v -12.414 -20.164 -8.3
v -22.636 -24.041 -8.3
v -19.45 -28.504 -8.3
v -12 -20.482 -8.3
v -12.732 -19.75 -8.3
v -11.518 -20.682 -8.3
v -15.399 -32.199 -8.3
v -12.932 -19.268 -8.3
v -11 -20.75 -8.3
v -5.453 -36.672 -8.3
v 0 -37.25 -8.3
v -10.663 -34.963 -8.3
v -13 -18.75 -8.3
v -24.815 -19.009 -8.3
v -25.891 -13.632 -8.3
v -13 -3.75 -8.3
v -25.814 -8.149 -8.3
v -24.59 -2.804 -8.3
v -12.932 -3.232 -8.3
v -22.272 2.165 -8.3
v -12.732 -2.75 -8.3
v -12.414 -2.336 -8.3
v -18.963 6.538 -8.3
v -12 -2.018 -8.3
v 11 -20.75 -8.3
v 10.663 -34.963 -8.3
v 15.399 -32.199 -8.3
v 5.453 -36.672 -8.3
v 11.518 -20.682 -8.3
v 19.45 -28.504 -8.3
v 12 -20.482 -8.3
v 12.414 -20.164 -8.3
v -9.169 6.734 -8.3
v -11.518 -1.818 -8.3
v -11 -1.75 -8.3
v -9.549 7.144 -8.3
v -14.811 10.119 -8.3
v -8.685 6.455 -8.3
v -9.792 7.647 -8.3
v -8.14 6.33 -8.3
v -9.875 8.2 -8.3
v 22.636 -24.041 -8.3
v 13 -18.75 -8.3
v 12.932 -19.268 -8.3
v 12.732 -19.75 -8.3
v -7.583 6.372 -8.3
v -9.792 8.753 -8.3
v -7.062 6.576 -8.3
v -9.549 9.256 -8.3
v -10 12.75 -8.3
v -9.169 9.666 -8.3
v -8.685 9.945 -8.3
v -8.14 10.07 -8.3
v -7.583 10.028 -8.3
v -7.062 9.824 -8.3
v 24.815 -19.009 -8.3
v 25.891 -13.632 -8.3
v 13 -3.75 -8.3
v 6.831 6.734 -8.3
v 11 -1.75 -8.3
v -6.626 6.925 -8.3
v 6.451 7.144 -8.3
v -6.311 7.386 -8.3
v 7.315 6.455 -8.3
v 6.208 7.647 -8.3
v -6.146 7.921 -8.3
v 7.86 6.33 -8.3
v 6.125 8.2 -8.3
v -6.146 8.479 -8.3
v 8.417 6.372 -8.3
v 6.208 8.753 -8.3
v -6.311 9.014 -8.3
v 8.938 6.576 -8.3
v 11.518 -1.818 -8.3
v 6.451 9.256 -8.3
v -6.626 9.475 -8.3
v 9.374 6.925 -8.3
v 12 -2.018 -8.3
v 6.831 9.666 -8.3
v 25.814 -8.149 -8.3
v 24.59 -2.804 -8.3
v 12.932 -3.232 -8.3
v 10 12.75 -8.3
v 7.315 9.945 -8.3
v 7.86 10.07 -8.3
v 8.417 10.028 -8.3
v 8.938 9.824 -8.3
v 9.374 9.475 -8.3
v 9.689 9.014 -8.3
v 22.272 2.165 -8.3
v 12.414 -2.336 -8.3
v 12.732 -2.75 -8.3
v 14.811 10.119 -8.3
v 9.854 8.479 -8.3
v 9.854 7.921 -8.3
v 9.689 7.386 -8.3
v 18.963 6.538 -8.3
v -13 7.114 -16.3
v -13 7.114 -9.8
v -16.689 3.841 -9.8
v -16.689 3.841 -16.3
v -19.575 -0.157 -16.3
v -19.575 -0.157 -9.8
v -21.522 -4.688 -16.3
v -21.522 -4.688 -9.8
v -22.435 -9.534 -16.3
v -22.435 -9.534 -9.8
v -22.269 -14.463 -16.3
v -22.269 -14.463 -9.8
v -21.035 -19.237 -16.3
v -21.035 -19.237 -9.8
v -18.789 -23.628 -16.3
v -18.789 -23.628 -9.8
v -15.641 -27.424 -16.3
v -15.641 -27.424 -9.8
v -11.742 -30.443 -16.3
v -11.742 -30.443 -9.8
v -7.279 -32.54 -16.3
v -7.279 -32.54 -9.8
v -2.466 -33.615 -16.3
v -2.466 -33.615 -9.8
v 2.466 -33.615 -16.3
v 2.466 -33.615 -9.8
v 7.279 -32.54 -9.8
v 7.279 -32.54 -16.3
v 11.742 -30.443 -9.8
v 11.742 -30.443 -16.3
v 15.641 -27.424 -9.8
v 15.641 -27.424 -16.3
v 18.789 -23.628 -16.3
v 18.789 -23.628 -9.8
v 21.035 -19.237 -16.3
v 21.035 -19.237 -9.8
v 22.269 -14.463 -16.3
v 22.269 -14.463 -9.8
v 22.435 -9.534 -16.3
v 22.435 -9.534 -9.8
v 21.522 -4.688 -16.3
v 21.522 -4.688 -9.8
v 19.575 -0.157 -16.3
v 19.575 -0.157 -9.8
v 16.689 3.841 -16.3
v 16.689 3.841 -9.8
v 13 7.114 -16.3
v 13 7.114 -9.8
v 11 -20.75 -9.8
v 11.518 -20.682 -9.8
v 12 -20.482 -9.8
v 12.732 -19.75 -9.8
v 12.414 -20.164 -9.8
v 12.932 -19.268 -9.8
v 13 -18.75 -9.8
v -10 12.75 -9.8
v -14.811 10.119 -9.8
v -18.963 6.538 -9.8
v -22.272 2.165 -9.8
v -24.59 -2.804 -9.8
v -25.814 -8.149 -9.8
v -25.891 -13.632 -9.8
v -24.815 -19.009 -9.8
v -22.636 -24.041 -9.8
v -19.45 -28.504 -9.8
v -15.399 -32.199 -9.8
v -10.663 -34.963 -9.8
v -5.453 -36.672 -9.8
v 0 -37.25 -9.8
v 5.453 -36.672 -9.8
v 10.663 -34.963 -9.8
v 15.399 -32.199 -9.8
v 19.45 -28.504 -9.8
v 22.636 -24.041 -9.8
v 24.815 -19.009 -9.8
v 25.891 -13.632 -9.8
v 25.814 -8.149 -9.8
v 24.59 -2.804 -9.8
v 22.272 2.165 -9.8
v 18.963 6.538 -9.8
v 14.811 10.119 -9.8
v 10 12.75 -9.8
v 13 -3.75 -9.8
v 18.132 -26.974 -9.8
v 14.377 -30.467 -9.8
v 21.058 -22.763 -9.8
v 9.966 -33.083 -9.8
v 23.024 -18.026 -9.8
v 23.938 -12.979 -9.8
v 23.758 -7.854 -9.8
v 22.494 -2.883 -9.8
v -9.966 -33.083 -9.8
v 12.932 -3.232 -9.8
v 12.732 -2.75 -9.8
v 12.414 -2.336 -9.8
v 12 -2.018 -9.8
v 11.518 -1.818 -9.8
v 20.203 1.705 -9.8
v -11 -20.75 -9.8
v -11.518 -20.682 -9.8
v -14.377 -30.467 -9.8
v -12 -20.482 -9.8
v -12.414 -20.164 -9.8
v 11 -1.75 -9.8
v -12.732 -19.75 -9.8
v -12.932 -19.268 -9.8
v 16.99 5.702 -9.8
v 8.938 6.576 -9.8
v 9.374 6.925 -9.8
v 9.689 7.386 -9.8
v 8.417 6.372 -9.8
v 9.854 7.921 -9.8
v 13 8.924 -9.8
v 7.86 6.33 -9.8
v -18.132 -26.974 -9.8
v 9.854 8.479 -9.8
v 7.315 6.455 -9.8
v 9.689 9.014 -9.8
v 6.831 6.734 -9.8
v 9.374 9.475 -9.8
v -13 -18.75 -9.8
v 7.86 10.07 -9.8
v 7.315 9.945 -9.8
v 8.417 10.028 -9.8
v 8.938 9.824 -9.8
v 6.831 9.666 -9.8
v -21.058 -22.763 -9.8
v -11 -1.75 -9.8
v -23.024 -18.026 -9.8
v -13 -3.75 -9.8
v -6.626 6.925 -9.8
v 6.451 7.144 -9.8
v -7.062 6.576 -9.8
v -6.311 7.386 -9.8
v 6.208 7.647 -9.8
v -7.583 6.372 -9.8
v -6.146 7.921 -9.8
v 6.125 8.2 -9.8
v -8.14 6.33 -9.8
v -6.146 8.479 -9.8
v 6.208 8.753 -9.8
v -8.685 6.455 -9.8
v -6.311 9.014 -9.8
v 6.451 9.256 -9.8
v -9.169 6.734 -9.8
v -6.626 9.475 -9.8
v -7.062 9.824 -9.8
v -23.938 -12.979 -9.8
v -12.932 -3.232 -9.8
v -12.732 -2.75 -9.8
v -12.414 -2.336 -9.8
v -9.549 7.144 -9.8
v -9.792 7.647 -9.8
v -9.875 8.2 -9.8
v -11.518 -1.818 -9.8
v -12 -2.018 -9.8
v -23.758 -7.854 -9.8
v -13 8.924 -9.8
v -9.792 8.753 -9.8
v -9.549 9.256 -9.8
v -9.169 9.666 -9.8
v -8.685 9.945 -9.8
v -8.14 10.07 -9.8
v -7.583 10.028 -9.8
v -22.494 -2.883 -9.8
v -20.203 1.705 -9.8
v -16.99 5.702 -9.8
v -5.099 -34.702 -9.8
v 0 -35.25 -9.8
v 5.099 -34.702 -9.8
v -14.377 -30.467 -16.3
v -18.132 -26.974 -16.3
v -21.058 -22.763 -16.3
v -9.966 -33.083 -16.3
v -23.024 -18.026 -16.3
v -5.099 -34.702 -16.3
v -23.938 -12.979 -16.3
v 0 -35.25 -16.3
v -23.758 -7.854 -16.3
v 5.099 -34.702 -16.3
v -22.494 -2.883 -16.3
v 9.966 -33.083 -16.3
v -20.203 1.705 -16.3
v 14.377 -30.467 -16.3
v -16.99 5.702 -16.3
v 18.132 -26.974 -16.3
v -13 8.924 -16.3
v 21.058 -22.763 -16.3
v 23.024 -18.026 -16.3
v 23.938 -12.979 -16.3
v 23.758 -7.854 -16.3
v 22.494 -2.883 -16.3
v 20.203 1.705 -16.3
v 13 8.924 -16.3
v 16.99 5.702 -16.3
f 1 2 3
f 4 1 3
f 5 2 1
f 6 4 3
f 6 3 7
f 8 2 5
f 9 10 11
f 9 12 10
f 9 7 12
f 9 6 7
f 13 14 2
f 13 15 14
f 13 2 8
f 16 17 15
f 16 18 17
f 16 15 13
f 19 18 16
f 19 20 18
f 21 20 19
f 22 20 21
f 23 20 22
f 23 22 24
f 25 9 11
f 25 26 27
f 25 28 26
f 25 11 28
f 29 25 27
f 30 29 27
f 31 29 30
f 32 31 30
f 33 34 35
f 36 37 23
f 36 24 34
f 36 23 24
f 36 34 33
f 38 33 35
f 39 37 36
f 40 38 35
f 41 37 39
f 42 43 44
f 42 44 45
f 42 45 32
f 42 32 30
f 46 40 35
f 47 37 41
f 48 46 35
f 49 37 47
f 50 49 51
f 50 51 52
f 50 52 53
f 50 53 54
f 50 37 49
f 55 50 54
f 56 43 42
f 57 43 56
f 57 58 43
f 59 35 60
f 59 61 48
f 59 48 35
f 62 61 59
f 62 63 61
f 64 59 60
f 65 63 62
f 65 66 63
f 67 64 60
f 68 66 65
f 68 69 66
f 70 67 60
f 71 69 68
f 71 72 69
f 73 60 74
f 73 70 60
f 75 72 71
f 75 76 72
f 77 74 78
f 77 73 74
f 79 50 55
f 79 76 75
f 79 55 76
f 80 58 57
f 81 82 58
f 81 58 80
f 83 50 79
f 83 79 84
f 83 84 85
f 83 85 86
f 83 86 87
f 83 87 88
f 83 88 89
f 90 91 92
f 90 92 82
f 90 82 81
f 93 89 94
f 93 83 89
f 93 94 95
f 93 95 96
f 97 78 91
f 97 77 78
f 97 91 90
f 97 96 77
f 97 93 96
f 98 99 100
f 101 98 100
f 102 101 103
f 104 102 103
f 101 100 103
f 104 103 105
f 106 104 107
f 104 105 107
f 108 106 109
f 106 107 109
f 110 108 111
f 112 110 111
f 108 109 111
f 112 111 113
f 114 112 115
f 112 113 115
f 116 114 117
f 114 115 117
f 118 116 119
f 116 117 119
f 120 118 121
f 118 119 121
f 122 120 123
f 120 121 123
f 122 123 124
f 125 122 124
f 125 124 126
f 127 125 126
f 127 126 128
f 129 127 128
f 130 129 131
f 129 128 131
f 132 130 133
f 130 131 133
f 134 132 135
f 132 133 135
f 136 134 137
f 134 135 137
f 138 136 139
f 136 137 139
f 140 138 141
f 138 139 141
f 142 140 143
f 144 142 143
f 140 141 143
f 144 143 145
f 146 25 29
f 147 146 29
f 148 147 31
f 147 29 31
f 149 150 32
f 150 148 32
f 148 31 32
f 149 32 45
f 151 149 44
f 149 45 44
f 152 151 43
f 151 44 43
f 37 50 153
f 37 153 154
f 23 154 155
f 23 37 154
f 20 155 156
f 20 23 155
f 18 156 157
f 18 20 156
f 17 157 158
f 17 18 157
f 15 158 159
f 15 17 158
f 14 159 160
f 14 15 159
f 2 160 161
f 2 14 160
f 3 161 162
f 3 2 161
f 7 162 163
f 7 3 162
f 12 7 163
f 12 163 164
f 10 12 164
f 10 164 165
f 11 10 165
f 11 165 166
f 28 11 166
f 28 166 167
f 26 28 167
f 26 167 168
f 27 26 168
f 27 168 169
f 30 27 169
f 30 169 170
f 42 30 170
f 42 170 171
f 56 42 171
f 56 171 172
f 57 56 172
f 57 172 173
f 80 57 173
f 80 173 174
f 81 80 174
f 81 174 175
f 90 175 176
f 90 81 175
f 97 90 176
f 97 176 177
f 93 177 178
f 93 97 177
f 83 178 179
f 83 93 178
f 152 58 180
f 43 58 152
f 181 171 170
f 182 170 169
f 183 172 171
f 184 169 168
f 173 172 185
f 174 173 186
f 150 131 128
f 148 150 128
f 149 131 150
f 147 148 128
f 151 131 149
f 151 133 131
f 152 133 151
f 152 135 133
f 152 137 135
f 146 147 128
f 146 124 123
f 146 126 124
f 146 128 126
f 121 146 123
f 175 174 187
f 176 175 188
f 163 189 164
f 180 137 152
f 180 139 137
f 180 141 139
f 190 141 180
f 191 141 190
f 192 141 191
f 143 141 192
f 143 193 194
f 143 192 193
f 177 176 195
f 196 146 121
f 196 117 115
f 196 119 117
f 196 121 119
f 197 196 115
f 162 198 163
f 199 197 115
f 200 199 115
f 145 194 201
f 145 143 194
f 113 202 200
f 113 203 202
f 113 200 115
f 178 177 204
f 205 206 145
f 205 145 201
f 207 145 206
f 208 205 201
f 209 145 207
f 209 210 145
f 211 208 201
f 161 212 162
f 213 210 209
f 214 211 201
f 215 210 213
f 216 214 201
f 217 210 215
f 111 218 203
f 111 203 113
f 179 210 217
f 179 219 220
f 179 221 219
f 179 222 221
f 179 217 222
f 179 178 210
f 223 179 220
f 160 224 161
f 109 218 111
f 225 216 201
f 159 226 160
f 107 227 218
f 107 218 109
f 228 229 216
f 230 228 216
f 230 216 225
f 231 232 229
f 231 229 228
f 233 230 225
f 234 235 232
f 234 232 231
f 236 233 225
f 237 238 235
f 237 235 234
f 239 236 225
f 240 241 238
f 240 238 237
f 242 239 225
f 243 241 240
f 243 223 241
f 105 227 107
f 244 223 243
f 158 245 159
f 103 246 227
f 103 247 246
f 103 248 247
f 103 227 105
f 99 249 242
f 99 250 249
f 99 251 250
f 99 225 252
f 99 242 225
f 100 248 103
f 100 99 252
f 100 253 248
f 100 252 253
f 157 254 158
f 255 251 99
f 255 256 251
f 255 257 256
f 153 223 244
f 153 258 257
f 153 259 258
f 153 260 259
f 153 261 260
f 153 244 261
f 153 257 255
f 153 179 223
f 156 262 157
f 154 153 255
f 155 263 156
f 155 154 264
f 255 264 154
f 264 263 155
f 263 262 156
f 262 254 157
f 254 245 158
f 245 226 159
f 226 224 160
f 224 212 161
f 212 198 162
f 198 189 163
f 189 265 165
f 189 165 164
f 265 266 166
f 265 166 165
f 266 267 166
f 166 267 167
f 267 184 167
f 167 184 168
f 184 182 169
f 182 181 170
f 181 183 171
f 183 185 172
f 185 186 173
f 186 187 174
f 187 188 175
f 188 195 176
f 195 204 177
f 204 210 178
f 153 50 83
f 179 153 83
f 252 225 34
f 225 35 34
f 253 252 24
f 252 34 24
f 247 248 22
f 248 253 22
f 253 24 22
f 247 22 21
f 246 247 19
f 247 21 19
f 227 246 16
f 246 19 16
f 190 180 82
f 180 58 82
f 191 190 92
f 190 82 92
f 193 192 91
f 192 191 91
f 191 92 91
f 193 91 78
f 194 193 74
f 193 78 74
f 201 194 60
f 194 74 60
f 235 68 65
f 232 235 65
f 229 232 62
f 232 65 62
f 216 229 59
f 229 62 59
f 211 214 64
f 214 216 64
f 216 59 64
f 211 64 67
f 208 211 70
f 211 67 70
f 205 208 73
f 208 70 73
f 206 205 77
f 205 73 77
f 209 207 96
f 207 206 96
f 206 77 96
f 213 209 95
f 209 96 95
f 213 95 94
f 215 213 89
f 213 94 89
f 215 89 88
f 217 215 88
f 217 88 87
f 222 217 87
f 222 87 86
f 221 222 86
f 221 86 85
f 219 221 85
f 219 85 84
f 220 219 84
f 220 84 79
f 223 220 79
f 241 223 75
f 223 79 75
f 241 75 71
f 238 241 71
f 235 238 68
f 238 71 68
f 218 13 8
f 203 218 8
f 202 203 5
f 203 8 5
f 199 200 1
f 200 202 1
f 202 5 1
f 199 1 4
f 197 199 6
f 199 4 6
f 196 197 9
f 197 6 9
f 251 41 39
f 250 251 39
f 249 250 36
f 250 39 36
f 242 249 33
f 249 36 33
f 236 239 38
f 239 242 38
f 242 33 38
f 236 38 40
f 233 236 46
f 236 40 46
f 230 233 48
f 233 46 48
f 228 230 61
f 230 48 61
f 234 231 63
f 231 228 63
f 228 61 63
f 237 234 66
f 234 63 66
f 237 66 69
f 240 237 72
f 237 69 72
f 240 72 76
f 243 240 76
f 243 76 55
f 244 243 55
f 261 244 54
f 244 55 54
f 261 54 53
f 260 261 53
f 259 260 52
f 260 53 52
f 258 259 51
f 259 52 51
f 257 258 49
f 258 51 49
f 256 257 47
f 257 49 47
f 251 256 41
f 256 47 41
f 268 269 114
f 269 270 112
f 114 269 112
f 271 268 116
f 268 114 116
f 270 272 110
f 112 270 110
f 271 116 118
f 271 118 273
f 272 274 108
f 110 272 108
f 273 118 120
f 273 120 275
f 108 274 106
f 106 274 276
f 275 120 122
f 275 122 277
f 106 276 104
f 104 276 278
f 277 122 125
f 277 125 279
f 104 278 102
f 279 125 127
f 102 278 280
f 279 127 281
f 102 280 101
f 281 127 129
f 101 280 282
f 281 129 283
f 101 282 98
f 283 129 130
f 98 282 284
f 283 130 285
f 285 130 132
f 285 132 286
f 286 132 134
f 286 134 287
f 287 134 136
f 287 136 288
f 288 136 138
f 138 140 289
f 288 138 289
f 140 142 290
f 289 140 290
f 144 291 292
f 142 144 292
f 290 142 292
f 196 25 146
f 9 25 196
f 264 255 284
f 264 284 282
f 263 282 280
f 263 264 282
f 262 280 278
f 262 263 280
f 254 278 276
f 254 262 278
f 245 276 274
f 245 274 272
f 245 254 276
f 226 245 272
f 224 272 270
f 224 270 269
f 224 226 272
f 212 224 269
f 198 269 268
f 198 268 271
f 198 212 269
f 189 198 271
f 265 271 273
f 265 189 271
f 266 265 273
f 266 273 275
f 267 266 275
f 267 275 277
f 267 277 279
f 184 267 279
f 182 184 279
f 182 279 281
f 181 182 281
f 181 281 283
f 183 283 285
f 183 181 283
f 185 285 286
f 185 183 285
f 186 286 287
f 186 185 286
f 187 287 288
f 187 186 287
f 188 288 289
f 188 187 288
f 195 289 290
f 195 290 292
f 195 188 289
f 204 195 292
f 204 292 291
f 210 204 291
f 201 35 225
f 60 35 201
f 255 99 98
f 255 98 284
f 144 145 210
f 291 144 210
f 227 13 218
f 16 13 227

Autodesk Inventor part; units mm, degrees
ref_plane "YZ Plane" through (0, 0, 0) normal (1, 0, 0) x (0, 1, 0)
ref_plane "作業平面1" through (0, 0, 0) normal (0, 0, 1) x (1, 0, 0)
ref_plane "作業平面2" through (0, 0, -8.3) normal (0, 0, -1) x (-1, 0, 0)
sketch "スケッチ1" plane through (0, 0, -8.3) normal (0, 0, -1) x (-1, 0, 0)
  circle A0 centre (0, -11.25) radius 6.5 projected
  circle A1 centre (0, -11.25) radius 26
  line L0 (10, 12.75) -> (-10, 12.75)
  line L1 (11, -1.75) -> (-11, -1.75)
  line L2 (-13, -3.75) -> (-13, -18.75)
  line L3 (-11, -20.75) -> (11, -20.75)
  line L4 (13, -18.75) -> (13, -3.75)
  line L5 (13, -1.75) -> (-13, -20.75) construction
  line L6 (-13, -1.75) -> (13, -20.75) construction
  arc A2 (11, -20.75) -> (13, -18.75) centre (11, -18.75) ccw
  arc A3 (13, -3.75) -> (11, -1.75) centre (11, -3.75) ccw
  arc A4 (-11, -1.75) -> (-13, -3.75) centre (-11, -3.75) ccw
  arc A5 (-13, -18.75) -> (-11, -20.75) centre (-11, -18.75) ccw
  circle A6 centre (8, 8.2) radius 2.425 projected
  circle A7 centre (-8, 8.2) radius 2.425 projected
  circle A8 centre (8, 8.2) radius 1.875
  circle A9 centre (-8, 8.2) radius 1.875
  point P0 (0, 0)
  dimension "d0" = 52
  dimension "d1" = 20
  dimension "d2" = 26
  dimension "d3" = 19
  dimension "d4" = 2
  dimension "d7" = 3.75
extrude "押し出し1" add sketch "スケッチ1" along normal blind 1.5 contours A1 L0 | A6 | A7 picked at (-0.9365, -26.1993)
sketch "スケッチ2" plane through (0, 0, -8.3) normal (0, 0, 1) x (1, 0, 0)
  circle A0 centre (0, -11.25) radius 24
  arc A1 (-10, 12.75) -> (10, 12.75) centre (0, -11.25) ccw projected
  arc A2 (-13, 7.1144) -> (13, 7.1144) centre (0, -11.25) ccw
  line L0 (-13, 7.1144) -> (-13, 8.9242)
  line L1 (13, 7.1144) -> (13, 8.9242)
  point P0 (0, 0)
  point P1 (13, 8.0193)
  dimension "d8" = 48
  dimension "d9" = 1.5
  dimension "d10" = 26
extrude "押し出し2" add sketch "スケッチ2" against normal blind 8 contours A0 L0 A2 L1 picked at (18.6222, -25.3282)
properties part number "Mirror_Mount"
